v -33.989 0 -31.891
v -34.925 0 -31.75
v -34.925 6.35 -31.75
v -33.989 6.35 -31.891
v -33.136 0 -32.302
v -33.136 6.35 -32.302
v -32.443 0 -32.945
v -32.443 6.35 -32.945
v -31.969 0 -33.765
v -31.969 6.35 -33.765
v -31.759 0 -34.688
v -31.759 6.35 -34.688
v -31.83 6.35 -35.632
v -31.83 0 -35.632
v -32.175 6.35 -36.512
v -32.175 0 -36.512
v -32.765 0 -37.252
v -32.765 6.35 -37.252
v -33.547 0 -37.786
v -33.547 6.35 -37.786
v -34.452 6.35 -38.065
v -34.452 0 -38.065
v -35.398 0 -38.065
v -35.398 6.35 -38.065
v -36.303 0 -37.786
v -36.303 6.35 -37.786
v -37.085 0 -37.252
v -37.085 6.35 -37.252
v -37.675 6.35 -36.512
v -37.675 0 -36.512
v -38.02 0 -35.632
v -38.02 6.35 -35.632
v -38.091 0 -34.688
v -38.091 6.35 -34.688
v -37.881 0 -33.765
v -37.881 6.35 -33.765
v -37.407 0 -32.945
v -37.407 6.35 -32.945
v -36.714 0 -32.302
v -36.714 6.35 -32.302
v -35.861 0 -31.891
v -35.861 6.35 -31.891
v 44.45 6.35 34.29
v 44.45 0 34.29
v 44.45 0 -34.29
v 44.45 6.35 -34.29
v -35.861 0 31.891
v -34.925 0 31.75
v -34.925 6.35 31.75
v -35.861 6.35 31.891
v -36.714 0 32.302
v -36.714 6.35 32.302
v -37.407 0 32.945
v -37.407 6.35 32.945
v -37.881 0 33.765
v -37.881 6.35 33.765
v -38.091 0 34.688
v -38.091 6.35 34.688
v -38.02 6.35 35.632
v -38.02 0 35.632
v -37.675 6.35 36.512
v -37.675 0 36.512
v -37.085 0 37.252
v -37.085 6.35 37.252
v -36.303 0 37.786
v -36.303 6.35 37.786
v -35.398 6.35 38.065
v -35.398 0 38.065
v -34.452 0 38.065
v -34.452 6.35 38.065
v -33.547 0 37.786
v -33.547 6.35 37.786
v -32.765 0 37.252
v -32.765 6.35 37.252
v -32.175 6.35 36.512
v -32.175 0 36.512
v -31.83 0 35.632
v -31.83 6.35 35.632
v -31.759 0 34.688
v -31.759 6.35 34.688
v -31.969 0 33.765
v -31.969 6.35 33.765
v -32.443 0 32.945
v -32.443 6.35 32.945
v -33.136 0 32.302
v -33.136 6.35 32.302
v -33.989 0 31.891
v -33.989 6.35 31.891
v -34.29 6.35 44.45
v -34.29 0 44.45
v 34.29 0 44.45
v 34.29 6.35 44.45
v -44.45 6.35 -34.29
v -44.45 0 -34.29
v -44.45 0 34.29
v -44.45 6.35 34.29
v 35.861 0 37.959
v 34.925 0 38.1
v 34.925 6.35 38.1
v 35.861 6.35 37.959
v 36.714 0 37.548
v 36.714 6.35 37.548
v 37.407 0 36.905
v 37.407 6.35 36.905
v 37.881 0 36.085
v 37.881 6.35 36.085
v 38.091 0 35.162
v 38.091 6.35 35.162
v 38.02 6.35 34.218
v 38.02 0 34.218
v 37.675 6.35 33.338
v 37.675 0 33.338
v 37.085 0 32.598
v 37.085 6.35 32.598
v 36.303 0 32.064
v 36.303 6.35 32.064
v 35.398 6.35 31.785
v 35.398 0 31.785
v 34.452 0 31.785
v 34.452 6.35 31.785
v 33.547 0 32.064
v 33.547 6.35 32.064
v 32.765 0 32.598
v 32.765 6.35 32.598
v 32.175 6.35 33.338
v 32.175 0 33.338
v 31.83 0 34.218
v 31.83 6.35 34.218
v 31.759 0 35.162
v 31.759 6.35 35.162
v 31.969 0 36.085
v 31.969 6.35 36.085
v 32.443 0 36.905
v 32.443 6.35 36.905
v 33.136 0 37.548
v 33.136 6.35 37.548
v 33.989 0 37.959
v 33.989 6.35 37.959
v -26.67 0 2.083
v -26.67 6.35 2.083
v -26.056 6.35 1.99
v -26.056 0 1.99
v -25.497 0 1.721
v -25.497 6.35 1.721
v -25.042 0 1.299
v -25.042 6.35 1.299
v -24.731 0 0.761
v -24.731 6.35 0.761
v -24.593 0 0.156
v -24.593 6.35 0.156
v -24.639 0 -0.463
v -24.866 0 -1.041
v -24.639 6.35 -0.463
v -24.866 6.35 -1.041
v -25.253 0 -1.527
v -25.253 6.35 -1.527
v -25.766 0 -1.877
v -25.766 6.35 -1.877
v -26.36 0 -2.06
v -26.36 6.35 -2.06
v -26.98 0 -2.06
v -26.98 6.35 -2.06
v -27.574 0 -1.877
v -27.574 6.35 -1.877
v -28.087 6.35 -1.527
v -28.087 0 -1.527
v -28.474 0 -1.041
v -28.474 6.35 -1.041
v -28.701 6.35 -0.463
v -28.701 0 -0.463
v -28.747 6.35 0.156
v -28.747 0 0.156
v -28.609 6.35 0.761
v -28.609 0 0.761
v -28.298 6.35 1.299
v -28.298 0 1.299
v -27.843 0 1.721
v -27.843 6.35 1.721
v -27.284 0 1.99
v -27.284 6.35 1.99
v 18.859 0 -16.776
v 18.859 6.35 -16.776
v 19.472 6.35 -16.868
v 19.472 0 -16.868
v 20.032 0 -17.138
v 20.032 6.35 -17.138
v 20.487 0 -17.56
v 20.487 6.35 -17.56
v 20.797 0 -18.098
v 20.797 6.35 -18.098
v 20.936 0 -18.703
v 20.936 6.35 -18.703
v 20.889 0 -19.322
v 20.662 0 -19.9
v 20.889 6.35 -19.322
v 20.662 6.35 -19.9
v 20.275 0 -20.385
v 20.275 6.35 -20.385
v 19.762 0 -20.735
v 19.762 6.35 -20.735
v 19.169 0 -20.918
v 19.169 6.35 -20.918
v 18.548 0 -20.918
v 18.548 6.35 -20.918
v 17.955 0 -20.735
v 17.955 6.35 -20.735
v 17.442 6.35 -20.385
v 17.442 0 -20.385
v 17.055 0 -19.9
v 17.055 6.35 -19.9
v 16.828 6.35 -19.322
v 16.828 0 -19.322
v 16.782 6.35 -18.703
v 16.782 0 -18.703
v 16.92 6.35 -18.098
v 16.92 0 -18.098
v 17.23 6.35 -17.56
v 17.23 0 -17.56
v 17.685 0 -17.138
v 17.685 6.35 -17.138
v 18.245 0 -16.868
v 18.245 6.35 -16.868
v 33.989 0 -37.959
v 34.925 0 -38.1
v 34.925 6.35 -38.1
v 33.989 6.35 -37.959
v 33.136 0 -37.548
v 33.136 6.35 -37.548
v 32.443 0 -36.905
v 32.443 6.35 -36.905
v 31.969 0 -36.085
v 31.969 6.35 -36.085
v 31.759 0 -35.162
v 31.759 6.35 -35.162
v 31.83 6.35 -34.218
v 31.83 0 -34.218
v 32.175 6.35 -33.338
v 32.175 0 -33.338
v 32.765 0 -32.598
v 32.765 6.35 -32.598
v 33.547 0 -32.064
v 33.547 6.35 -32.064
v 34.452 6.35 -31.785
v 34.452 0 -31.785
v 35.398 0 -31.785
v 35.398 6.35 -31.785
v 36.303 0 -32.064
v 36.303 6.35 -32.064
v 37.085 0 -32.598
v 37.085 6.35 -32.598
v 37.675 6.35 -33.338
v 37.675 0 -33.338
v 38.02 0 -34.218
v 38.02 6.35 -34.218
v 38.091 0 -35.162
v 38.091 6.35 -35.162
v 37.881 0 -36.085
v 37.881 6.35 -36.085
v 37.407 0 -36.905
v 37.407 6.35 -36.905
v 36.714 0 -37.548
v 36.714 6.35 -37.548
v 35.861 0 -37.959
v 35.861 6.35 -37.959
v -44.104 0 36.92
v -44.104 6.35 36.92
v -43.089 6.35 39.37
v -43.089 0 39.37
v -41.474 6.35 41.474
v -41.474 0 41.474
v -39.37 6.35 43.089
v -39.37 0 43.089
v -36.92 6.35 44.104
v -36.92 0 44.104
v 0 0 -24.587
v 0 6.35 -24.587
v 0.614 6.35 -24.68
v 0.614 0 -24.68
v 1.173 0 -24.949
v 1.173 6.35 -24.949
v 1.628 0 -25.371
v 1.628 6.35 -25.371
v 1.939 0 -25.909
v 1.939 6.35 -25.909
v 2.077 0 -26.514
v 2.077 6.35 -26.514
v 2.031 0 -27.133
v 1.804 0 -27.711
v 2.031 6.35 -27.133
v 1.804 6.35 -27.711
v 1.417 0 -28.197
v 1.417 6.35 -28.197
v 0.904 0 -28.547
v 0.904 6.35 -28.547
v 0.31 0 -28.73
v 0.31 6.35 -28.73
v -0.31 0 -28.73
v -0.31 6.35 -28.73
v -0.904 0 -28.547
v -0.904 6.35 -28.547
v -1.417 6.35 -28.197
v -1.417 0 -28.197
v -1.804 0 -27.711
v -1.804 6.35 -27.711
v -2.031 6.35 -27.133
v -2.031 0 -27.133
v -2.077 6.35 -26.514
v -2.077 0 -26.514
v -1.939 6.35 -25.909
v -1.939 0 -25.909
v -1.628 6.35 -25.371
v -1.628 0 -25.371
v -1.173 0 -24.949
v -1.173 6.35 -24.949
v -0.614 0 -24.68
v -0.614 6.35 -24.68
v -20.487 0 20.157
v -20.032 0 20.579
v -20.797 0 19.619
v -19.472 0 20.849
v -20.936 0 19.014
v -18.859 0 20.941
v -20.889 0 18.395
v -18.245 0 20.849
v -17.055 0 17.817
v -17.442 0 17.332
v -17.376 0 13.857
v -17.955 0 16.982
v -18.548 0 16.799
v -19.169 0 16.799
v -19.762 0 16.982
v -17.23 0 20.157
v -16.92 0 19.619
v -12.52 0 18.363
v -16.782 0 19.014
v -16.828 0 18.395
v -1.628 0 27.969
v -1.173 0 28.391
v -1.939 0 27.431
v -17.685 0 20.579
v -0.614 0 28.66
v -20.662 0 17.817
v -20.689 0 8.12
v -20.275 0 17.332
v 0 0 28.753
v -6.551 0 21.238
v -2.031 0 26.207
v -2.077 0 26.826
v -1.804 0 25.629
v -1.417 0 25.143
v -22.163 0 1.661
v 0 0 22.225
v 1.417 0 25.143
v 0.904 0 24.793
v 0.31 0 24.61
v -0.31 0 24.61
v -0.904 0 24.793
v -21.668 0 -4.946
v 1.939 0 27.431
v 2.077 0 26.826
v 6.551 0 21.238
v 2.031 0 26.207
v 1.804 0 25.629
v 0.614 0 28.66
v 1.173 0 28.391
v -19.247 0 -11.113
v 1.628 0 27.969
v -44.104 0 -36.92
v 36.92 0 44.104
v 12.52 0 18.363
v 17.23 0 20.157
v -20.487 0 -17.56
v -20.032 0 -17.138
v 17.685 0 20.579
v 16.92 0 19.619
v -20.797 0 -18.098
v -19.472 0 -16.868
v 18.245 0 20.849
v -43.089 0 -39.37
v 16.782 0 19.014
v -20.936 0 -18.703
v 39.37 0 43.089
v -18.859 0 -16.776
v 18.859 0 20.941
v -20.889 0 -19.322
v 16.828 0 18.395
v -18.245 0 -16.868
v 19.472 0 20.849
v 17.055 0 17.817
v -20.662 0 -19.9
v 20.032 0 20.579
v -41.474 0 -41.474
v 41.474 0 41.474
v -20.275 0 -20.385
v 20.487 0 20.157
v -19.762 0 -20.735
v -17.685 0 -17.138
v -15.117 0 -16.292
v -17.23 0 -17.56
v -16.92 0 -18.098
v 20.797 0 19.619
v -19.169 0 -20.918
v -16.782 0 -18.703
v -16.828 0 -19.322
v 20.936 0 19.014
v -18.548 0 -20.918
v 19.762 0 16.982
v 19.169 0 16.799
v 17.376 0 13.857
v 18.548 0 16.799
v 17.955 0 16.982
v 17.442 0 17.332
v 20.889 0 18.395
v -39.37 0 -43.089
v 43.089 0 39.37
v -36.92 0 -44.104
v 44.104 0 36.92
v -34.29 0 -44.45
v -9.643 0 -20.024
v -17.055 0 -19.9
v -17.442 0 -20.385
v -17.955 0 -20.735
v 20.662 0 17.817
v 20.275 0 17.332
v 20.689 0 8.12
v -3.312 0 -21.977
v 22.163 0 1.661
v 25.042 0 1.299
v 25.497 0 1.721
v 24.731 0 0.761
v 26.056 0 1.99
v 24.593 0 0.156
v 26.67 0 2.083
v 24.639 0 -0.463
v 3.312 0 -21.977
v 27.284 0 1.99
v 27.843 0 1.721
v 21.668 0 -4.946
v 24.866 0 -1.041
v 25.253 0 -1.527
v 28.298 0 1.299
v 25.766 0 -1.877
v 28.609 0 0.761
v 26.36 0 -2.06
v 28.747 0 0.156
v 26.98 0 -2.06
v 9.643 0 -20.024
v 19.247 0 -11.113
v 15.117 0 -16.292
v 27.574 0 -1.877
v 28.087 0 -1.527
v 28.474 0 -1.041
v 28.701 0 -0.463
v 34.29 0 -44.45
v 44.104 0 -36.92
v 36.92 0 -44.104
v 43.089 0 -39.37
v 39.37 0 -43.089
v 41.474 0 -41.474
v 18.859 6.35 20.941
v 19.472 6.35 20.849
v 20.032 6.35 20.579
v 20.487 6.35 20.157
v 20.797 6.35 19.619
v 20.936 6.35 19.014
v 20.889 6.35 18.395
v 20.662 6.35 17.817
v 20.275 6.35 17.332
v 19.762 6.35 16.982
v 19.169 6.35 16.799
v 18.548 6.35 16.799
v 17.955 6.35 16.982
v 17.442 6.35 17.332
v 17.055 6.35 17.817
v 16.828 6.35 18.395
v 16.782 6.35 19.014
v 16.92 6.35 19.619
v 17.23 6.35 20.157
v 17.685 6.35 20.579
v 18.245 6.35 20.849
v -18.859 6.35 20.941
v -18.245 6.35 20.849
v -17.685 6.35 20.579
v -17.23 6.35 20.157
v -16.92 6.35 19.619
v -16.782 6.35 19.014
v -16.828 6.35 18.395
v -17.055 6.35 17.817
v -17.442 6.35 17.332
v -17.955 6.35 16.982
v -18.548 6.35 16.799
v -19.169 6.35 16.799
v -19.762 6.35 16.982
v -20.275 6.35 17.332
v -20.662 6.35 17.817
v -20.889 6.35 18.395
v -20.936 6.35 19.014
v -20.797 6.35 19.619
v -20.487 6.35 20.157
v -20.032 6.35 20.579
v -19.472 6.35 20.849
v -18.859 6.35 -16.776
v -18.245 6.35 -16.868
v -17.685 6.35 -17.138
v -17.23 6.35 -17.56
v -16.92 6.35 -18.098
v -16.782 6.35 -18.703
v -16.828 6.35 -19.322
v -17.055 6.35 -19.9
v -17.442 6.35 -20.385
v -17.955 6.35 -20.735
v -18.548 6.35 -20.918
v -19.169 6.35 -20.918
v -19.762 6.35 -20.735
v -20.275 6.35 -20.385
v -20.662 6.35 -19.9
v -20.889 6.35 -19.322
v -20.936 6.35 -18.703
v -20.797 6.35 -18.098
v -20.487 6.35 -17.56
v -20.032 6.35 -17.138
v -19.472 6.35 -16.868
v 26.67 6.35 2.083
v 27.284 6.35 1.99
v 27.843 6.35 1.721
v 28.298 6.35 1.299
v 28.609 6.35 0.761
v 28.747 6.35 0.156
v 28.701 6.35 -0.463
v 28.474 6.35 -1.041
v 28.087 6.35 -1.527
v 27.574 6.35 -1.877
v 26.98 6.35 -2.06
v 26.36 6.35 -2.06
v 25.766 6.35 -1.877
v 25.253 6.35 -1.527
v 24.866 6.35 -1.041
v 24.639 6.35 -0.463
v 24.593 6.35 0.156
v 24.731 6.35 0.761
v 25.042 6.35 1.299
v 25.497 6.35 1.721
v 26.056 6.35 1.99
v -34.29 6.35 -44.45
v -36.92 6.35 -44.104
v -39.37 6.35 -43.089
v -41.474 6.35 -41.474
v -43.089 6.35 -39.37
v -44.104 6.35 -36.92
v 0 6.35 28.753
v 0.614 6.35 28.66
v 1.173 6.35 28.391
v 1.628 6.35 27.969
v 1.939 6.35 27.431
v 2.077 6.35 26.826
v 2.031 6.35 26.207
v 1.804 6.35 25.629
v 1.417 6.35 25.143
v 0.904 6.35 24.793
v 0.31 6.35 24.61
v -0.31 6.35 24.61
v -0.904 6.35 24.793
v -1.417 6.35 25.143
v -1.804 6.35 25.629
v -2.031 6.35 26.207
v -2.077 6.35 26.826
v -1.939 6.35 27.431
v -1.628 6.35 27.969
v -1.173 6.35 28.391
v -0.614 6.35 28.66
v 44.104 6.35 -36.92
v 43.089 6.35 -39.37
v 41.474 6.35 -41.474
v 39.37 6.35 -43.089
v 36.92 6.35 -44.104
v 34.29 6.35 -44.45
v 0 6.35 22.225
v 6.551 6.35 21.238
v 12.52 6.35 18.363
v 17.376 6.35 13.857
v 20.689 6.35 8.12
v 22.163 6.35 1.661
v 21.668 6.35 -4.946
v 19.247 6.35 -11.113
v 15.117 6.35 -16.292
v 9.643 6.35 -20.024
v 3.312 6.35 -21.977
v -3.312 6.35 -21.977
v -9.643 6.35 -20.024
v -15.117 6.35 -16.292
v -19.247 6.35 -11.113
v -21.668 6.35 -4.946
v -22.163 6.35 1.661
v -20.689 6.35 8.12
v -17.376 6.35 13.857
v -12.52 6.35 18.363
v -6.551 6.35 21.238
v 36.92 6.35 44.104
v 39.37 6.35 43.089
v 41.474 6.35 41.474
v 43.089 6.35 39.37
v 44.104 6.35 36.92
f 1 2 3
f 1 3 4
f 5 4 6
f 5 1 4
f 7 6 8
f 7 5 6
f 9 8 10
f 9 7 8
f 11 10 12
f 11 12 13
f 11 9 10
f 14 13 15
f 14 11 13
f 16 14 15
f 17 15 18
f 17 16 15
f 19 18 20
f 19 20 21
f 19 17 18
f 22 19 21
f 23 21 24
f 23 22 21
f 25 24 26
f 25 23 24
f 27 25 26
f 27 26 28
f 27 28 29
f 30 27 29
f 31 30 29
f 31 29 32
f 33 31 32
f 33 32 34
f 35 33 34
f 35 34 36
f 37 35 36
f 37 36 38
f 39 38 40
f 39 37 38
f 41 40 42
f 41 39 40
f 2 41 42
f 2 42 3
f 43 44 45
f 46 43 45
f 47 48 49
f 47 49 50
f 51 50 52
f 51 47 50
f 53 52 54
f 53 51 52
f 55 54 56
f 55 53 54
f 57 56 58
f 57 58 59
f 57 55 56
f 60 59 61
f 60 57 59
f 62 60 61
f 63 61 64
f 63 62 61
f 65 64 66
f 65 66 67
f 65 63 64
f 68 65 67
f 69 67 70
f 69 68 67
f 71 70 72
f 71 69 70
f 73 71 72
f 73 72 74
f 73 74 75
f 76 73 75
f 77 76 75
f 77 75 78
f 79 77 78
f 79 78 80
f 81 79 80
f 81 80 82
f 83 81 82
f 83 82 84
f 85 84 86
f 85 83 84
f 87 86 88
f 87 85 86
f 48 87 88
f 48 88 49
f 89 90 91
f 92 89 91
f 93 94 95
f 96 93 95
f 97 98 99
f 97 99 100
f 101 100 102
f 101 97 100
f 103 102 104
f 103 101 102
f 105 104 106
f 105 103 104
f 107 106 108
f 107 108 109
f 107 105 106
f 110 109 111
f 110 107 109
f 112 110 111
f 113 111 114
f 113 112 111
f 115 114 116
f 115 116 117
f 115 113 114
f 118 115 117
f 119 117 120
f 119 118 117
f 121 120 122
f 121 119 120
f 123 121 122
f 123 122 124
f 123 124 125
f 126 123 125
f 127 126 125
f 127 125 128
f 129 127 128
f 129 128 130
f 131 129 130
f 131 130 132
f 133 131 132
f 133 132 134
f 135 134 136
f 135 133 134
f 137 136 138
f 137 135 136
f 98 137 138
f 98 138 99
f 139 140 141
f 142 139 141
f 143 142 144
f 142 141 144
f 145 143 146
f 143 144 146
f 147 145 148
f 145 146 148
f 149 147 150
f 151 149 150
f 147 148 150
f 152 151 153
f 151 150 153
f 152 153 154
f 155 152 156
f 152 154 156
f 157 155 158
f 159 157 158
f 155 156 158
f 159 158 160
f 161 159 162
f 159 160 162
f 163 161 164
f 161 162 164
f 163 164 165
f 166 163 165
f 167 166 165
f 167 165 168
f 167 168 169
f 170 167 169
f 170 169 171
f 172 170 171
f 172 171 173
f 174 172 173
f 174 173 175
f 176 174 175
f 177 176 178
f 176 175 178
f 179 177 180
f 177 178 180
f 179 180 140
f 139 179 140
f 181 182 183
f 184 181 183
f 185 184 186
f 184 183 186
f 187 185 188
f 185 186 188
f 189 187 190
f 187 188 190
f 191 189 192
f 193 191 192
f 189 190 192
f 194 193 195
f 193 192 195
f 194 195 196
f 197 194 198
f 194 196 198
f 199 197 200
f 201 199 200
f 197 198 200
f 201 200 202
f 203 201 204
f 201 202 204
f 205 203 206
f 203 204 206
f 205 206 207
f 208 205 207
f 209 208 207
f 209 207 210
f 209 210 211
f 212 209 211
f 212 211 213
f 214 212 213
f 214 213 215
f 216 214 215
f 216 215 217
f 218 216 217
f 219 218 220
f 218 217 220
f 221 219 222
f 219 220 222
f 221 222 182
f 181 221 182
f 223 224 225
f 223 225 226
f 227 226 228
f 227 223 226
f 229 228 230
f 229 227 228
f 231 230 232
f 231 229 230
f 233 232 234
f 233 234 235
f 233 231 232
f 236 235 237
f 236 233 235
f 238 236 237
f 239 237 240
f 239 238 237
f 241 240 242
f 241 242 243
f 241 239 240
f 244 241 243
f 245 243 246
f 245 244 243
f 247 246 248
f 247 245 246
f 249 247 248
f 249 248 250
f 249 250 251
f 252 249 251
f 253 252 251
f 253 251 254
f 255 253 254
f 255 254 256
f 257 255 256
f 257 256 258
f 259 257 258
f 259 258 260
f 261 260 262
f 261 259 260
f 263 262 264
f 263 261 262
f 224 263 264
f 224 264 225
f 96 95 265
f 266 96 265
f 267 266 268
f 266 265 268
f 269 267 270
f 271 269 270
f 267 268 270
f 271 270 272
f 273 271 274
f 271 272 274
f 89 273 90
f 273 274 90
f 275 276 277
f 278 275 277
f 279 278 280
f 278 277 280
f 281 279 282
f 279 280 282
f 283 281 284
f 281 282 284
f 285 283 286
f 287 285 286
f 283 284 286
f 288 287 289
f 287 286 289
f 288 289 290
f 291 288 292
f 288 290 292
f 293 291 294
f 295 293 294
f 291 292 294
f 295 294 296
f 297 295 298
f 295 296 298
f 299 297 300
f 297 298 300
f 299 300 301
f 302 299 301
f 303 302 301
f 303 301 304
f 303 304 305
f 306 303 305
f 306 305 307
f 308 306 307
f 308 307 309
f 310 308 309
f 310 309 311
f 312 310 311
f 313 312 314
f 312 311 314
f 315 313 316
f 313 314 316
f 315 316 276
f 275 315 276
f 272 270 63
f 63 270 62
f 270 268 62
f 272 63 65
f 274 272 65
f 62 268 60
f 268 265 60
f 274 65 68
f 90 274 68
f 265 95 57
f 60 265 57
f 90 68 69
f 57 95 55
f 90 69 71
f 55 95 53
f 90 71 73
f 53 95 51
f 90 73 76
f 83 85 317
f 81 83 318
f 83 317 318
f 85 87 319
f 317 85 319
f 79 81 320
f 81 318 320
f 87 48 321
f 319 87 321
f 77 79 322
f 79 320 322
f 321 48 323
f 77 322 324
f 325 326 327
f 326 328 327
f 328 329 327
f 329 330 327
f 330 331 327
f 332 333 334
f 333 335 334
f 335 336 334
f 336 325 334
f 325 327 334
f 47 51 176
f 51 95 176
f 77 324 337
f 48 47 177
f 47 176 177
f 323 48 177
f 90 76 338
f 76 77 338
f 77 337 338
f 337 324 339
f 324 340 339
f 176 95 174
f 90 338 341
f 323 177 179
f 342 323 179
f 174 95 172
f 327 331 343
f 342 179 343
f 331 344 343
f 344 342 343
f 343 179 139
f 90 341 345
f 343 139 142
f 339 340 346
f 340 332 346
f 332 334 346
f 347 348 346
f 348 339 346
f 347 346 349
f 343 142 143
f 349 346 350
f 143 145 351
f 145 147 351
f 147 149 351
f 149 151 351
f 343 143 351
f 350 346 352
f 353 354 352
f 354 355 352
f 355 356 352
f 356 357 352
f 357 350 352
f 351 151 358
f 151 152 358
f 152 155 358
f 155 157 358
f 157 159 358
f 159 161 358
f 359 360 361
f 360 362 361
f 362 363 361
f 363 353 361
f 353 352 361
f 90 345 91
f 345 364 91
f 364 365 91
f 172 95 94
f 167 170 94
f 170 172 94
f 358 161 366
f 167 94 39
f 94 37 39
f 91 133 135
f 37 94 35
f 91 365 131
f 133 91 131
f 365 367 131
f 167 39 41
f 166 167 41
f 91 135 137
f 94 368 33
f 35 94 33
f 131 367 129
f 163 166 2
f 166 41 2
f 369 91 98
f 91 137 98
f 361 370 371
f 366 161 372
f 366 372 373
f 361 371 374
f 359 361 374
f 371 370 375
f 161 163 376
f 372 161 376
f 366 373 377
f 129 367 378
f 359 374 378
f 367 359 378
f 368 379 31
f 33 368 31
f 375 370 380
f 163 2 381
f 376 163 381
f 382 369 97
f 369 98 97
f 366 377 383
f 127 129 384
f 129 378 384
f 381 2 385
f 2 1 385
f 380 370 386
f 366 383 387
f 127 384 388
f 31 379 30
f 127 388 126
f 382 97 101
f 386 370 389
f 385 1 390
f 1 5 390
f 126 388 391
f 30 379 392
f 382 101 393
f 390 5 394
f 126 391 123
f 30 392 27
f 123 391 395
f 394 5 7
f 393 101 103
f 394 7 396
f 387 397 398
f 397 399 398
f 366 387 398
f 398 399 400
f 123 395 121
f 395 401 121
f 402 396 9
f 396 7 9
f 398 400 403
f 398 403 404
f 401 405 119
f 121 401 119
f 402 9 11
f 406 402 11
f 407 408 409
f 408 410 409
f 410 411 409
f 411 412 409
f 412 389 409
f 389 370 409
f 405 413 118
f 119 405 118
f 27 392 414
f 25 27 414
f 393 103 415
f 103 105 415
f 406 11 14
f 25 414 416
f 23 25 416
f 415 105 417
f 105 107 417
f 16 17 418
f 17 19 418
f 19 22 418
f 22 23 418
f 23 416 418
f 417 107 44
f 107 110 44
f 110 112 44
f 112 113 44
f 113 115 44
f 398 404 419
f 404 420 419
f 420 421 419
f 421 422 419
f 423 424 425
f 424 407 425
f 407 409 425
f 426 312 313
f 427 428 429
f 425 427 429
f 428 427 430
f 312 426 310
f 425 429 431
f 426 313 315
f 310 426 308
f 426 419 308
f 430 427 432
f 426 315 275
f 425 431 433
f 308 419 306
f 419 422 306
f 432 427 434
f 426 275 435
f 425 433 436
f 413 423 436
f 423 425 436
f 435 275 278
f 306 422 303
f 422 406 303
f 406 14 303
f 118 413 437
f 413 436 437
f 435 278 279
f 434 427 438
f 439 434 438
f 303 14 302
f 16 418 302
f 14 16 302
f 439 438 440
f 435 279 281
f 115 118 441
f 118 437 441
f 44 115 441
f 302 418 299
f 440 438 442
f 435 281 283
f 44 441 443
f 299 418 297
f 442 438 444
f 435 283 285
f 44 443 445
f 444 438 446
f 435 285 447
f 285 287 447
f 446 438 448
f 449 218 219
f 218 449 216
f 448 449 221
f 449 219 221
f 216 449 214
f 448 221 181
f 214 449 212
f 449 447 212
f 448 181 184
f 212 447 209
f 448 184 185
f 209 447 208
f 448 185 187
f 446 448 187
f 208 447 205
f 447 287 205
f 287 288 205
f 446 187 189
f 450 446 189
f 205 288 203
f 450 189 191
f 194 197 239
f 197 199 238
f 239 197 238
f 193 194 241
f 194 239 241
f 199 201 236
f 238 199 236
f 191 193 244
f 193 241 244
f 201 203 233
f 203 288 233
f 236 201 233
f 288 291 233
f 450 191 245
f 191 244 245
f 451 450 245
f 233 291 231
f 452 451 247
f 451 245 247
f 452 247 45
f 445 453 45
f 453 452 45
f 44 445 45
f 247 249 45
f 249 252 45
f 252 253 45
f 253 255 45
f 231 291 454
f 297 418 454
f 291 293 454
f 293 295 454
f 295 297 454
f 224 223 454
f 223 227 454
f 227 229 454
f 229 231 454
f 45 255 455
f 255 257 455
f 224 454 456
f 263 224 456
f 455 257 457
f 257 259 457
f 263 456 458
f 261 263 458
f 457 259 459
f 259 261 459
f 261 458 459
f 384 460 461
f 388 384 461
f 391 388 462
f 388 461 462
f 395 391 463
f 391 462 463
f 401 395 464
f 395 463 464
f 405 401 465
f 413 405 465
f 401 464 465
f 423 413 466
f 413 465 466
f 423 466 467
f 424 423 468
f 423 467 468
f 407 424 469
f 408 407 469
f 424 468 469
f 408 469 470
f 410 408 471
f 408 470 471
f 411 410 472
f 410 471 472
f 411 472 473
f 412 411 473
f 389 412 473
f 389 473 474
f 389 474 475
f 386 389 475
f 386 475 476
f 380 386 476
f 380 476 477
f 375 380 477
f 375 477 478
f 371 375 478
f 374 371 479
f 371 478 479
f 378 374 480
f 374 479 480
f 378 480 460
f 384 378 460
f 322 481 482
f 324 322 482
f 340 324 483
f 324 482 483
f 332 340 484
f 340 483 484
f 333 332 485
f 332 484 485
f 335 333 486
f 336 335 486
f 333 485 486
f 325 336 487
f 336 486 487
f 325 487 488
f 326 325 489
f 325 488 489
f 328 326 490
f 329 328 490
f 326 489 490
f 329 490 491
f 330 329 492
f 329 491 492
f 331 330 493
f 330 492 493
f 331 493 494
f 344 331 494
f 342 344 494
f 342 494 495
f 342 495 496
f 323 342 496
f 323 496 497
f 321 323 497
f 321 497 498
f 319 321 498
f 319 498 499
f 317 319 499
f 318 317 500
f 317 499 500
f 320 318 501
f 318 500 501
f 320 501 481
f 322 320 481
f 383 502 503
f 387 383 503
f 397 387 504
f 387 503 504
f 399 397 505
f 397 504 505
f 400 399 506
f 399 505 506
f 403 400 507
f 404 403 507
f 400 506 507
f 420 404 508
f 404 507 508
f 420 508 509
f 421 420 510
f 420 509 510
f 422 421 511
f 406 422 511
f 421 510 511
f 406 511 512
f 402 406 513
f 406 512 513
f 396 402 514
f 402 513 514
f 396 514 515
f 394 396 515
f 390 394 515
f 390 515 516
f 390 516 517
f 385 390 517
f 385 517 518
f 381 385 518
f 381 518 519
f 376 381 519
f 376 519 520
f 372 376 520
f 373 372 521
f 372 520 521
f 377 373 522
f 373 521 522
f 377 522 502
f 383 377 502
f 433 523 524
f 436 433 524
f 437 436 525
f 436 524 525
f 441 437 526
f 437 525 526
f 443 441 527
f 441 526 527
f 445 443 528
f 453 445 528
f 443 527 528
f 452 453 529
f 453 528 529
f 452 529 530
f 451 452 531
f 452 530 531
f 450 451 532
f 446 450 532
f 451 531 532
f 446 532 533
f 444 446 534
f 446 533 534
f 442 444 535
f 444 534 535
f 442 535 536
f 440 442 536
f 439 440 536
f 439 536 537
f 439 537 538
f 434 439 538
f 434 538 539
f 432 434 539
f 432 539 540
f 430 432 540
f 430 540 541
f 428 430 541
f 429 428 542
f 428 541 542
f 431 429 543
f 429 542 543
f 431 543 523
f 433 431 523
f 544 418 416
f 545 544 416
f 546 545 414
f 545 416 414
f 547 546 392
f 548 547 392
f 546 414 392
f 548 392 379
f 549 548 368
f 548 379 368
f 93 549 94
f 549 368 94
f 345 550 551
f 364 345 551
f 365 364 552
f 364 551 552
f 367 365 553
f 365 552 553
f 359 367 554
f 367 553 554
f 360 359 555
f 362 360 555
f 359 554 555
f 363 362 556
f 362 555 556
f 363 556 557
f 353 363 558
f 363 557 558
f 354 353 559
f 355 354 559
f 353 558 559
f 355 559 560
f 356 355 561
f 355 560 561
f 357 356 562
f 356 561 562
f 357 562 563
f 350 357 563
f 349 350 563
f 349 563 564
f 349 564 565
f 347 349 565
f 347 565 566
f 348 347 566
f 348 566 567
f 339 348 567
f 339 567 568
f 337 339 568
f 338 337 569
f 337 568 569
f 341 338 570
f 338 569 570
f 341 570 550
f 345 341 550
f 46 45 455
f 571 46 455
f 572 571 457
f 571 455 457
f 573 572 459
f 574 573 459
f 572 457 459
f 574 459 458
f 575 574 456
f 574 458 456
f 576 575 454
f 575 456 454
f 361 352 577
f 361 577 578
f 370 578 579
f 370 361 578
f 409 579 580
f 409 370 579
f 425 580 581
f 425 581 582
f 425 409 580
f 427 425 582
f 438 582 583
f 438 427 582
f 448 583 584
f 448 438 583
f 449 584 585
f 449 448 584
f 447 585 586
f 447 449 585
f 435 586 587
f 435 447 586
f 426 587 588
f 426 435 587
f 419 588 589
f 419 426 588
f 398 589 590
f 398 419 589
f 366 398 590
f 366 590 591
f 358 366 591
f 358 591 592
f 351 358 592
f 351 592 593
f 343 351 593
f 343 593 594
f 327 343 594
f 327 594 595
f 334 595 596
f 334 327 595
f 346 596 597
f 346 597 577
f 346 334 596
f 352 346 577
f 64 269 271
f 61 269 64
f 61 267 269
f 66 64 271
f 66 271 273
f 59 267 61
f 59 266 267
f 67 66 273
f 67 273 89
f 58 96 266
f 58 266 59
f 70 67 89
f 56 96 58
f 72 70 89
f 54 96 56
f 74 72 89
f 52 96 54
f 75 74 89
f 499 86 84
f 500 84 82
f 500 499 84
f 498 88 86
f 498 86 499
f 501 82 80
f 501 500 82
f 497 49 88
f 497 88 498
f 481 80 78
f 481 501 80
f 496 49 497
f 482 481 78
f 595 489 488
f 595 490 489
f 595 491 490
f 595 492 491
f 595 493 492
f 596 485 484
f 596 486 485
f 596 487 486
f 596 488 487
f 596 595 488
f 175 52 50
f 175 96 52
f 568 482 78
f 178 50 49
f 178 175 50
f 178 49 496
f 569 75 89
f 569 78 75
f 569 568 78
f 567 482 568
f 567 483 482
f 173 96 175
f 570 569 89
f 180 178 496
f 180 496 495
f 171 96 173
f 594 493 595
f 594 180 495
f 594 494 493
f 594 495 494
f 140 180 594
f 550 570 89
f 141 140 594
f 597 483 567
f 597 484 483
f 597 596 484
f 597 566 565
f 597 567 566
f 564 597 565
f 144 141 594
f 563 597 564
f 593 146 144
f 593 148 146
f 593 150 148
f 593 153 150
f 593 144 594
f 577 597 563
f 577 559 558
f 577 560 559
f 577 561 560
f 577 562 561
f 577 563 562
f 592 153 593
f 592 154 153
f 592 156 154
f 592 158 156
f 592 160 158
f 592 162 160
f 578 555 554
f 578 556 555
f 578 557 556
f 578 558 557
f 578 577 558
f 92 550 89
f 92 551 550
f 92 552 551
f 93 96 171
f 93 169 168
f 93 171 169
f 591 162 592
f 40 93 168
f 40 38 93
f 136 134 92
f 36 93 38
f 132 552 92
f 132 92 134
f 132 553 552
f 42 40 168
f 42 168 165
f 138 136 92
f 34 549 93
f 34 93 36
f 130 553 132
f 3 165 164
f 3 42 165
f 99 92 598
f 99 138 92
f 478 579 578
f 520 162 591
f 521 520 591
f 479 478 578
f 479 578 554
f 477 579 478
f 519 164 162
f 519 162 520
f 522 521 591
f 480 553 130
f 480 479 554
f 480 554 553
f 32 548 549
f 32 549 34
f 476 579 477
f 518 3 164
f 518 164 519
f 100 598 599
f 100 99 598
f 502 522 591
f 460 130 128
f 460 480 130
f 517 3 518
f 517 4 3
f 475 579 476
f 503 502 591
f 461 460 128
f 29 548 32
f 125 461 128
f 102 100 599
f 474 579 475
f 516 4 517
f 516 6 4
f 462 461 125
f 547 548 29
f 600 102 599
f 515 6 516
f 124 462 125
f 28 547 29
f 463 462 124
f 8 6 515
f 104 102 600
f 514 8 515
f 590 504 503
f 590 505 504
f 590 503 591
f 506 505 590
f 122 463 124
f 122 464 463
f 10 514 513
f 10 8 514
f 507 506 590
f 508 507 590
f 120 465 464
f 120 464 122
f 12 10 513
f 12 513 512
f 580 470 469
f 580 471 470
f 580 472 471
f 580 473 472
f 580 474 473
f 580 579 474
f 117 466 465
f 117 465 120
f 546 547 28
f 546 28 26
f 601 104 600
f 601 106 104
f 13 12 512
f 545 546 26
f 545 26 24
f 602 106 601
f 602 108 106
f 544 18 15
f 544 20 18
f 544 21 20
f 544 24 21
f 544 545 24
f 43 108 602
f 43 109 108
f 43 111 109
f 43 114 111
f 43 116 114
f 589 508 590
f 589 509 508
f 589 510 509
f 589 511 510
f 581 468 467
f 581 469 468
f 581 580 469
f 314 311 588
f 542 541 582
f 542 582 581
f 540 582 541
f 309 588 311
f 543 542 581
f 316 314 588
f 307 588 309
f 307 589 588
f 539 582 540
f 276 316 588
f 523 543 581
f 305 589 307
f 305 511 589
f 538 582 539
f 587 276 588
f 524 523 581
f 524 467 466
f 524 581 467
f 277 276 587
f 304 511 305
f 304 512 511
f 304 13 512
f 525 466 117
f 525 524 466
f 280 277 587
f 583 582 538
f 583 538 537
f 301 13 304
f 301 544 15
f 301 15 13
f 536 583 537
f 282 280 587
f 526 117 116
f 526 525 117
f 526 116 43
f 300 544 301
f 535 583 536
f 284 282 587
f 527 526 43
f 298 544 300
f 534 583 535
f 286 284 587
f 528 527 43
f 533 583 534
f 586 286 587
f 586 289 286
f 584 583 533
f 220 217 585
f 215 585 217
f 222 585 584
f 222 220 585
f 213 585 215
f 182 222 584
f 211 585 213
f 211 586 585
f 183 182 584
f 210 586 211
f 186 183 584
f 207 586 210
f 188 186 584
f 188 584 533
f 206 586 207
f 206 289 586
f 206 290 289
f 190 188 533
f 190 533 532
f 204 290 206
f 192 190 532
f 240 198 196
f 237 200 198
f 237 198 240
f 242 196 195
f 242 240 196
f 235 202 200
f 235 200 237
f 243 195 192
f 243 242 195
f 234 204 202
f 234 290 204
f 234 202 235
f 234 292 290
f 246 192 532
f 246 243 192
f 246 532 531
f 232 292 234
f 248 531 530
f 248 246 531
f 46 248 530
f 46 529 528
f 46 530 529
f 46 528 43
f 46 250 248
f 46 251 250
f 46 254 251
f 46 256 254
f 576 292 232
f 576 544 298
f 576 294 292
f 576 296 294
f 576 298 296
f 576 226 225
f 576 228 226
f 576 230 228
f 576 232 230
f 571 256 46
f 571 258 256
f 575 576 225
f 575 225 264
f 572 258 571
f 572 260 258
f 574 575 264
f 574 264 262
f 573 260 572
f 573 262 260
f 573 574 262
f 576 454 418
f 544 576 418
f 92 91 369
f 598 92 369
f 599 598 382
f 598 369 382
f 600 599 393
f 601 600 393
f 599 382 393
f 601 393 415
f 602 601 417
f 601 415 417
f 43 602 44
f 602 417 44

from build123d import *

# Parameters (mm, degrees)
SKETCH2_R           = 22.225
SKETCH2_R_2         = 3.175
BOSS_EXTRUDE1_DEPTH = 6.35
SKETCH3_R           = 2.0828
CUT_EXTRUDE1_DEPTH  = 6.35


with BuildPart() as part:
    # Sketch2 → Boss-Extrude1 (new body)
    with BuildSketch(Plane(origin=(0, 0, 0), x_dir=(1, 0, 0), z_dir=(0, 1, 0))):
        with BuildLine():
            Line((-34.29, -44.45), (34.29, -44.45))
            ThreePointArc((34.29, -44.45), (41.474204897, -41.474204897), (44.45, -34.29))
            Line((44.45, -34.29), (44.45, 34.29))
            ThreePointArc((44.45, 34.29), (41.474204897, 41.474204897), (34.29, 44.45))
            Line((34.29, 44.45), (-34.29, 44.45))
            ThreePointArc((-34.29, 44.45), (-41.474204897, 41.474204897), (-44.45, 34.29))
            Line((-44.45, 34.29), (-44.45, -34.29))
            ThreePointArc((-44.45, -34.29), (-41.474204897, -41.474204897), (-34.29, -44.45))
        make_face()
        with Locations(Location((0, 0, 0), (0, 0, 270))):
            Circle(SKETCH2_R, mode=Mode.SUBTRACT)
        with Locations(Location((-34.925, 34.925, 0), (0, 0, 270))):
            Circle(SKETCH2_R_2, mode=Mode.SUBTRACT)
        with Locations(Location((34.925, 34.925, 0), (0, 0, 90))):
            Circle(SKETCH2_R_2, mode=Mode.SUBTRACT)
        with Locations(Location((34.925, -34.925, 0), (0, 0, 270))):
            Circle(SKETCH2_R_2, mode=Mode.SUBTRACT)
        with Locations(Location((-34.925, -34.925, 0), (0, 0, 90))):
            Circle(SKETCH2_R_2, mode=Mode.SUBTRACT)
    extrude(amount=BOSS_EXTRUDE1_DEPTH)

    # Sketch3 → Cut-Extrude1 (cut)
    with BuildSketch(Plane(origin=(0, 6.35, 0), x_dir=(1, 0, 0), z_dir=(0, 1, 0))):
        with Locations(Location((26.67, 0, 0), (0, 0, 270))):
            Circle(SKETCH3_R)
        with Locations(Location((18.858537854, -18.858537854, 0), (0, 0, 270))):
            Circle(SKETCH3_R)
        with Locations(Location((0, -26.67, 0), (0, 0, 270))):
            Circle(SKETCH3_R)
        with Locations(Location((-18.858537854, -18.858537854, 0), (0, 0, 270))):
            Circle(SKETCH3_R)
        with Locations(Location((-26.67, 0, 0), (0, 0, 270))):
            Circle(SKETCH3_R)
        with Locations(Location((-18.858537854, 18.858537854, 0), (0, 0, 270))):
            Circle(SKETCH3_R)
        with Locations(Location((0, 26.67, 0), (0, 0, 270))):
            Circle(SKETCH3_R)
        with Locations(Location((18.858537854, 18.858537854, 0), (0, 0, 270))):
            Circle(SKETCH3_R)
    extrude(amount=-CUT_EXTRUDE1_DEPTH, mode=Mode.SUBTRACT)


solid = part.part
